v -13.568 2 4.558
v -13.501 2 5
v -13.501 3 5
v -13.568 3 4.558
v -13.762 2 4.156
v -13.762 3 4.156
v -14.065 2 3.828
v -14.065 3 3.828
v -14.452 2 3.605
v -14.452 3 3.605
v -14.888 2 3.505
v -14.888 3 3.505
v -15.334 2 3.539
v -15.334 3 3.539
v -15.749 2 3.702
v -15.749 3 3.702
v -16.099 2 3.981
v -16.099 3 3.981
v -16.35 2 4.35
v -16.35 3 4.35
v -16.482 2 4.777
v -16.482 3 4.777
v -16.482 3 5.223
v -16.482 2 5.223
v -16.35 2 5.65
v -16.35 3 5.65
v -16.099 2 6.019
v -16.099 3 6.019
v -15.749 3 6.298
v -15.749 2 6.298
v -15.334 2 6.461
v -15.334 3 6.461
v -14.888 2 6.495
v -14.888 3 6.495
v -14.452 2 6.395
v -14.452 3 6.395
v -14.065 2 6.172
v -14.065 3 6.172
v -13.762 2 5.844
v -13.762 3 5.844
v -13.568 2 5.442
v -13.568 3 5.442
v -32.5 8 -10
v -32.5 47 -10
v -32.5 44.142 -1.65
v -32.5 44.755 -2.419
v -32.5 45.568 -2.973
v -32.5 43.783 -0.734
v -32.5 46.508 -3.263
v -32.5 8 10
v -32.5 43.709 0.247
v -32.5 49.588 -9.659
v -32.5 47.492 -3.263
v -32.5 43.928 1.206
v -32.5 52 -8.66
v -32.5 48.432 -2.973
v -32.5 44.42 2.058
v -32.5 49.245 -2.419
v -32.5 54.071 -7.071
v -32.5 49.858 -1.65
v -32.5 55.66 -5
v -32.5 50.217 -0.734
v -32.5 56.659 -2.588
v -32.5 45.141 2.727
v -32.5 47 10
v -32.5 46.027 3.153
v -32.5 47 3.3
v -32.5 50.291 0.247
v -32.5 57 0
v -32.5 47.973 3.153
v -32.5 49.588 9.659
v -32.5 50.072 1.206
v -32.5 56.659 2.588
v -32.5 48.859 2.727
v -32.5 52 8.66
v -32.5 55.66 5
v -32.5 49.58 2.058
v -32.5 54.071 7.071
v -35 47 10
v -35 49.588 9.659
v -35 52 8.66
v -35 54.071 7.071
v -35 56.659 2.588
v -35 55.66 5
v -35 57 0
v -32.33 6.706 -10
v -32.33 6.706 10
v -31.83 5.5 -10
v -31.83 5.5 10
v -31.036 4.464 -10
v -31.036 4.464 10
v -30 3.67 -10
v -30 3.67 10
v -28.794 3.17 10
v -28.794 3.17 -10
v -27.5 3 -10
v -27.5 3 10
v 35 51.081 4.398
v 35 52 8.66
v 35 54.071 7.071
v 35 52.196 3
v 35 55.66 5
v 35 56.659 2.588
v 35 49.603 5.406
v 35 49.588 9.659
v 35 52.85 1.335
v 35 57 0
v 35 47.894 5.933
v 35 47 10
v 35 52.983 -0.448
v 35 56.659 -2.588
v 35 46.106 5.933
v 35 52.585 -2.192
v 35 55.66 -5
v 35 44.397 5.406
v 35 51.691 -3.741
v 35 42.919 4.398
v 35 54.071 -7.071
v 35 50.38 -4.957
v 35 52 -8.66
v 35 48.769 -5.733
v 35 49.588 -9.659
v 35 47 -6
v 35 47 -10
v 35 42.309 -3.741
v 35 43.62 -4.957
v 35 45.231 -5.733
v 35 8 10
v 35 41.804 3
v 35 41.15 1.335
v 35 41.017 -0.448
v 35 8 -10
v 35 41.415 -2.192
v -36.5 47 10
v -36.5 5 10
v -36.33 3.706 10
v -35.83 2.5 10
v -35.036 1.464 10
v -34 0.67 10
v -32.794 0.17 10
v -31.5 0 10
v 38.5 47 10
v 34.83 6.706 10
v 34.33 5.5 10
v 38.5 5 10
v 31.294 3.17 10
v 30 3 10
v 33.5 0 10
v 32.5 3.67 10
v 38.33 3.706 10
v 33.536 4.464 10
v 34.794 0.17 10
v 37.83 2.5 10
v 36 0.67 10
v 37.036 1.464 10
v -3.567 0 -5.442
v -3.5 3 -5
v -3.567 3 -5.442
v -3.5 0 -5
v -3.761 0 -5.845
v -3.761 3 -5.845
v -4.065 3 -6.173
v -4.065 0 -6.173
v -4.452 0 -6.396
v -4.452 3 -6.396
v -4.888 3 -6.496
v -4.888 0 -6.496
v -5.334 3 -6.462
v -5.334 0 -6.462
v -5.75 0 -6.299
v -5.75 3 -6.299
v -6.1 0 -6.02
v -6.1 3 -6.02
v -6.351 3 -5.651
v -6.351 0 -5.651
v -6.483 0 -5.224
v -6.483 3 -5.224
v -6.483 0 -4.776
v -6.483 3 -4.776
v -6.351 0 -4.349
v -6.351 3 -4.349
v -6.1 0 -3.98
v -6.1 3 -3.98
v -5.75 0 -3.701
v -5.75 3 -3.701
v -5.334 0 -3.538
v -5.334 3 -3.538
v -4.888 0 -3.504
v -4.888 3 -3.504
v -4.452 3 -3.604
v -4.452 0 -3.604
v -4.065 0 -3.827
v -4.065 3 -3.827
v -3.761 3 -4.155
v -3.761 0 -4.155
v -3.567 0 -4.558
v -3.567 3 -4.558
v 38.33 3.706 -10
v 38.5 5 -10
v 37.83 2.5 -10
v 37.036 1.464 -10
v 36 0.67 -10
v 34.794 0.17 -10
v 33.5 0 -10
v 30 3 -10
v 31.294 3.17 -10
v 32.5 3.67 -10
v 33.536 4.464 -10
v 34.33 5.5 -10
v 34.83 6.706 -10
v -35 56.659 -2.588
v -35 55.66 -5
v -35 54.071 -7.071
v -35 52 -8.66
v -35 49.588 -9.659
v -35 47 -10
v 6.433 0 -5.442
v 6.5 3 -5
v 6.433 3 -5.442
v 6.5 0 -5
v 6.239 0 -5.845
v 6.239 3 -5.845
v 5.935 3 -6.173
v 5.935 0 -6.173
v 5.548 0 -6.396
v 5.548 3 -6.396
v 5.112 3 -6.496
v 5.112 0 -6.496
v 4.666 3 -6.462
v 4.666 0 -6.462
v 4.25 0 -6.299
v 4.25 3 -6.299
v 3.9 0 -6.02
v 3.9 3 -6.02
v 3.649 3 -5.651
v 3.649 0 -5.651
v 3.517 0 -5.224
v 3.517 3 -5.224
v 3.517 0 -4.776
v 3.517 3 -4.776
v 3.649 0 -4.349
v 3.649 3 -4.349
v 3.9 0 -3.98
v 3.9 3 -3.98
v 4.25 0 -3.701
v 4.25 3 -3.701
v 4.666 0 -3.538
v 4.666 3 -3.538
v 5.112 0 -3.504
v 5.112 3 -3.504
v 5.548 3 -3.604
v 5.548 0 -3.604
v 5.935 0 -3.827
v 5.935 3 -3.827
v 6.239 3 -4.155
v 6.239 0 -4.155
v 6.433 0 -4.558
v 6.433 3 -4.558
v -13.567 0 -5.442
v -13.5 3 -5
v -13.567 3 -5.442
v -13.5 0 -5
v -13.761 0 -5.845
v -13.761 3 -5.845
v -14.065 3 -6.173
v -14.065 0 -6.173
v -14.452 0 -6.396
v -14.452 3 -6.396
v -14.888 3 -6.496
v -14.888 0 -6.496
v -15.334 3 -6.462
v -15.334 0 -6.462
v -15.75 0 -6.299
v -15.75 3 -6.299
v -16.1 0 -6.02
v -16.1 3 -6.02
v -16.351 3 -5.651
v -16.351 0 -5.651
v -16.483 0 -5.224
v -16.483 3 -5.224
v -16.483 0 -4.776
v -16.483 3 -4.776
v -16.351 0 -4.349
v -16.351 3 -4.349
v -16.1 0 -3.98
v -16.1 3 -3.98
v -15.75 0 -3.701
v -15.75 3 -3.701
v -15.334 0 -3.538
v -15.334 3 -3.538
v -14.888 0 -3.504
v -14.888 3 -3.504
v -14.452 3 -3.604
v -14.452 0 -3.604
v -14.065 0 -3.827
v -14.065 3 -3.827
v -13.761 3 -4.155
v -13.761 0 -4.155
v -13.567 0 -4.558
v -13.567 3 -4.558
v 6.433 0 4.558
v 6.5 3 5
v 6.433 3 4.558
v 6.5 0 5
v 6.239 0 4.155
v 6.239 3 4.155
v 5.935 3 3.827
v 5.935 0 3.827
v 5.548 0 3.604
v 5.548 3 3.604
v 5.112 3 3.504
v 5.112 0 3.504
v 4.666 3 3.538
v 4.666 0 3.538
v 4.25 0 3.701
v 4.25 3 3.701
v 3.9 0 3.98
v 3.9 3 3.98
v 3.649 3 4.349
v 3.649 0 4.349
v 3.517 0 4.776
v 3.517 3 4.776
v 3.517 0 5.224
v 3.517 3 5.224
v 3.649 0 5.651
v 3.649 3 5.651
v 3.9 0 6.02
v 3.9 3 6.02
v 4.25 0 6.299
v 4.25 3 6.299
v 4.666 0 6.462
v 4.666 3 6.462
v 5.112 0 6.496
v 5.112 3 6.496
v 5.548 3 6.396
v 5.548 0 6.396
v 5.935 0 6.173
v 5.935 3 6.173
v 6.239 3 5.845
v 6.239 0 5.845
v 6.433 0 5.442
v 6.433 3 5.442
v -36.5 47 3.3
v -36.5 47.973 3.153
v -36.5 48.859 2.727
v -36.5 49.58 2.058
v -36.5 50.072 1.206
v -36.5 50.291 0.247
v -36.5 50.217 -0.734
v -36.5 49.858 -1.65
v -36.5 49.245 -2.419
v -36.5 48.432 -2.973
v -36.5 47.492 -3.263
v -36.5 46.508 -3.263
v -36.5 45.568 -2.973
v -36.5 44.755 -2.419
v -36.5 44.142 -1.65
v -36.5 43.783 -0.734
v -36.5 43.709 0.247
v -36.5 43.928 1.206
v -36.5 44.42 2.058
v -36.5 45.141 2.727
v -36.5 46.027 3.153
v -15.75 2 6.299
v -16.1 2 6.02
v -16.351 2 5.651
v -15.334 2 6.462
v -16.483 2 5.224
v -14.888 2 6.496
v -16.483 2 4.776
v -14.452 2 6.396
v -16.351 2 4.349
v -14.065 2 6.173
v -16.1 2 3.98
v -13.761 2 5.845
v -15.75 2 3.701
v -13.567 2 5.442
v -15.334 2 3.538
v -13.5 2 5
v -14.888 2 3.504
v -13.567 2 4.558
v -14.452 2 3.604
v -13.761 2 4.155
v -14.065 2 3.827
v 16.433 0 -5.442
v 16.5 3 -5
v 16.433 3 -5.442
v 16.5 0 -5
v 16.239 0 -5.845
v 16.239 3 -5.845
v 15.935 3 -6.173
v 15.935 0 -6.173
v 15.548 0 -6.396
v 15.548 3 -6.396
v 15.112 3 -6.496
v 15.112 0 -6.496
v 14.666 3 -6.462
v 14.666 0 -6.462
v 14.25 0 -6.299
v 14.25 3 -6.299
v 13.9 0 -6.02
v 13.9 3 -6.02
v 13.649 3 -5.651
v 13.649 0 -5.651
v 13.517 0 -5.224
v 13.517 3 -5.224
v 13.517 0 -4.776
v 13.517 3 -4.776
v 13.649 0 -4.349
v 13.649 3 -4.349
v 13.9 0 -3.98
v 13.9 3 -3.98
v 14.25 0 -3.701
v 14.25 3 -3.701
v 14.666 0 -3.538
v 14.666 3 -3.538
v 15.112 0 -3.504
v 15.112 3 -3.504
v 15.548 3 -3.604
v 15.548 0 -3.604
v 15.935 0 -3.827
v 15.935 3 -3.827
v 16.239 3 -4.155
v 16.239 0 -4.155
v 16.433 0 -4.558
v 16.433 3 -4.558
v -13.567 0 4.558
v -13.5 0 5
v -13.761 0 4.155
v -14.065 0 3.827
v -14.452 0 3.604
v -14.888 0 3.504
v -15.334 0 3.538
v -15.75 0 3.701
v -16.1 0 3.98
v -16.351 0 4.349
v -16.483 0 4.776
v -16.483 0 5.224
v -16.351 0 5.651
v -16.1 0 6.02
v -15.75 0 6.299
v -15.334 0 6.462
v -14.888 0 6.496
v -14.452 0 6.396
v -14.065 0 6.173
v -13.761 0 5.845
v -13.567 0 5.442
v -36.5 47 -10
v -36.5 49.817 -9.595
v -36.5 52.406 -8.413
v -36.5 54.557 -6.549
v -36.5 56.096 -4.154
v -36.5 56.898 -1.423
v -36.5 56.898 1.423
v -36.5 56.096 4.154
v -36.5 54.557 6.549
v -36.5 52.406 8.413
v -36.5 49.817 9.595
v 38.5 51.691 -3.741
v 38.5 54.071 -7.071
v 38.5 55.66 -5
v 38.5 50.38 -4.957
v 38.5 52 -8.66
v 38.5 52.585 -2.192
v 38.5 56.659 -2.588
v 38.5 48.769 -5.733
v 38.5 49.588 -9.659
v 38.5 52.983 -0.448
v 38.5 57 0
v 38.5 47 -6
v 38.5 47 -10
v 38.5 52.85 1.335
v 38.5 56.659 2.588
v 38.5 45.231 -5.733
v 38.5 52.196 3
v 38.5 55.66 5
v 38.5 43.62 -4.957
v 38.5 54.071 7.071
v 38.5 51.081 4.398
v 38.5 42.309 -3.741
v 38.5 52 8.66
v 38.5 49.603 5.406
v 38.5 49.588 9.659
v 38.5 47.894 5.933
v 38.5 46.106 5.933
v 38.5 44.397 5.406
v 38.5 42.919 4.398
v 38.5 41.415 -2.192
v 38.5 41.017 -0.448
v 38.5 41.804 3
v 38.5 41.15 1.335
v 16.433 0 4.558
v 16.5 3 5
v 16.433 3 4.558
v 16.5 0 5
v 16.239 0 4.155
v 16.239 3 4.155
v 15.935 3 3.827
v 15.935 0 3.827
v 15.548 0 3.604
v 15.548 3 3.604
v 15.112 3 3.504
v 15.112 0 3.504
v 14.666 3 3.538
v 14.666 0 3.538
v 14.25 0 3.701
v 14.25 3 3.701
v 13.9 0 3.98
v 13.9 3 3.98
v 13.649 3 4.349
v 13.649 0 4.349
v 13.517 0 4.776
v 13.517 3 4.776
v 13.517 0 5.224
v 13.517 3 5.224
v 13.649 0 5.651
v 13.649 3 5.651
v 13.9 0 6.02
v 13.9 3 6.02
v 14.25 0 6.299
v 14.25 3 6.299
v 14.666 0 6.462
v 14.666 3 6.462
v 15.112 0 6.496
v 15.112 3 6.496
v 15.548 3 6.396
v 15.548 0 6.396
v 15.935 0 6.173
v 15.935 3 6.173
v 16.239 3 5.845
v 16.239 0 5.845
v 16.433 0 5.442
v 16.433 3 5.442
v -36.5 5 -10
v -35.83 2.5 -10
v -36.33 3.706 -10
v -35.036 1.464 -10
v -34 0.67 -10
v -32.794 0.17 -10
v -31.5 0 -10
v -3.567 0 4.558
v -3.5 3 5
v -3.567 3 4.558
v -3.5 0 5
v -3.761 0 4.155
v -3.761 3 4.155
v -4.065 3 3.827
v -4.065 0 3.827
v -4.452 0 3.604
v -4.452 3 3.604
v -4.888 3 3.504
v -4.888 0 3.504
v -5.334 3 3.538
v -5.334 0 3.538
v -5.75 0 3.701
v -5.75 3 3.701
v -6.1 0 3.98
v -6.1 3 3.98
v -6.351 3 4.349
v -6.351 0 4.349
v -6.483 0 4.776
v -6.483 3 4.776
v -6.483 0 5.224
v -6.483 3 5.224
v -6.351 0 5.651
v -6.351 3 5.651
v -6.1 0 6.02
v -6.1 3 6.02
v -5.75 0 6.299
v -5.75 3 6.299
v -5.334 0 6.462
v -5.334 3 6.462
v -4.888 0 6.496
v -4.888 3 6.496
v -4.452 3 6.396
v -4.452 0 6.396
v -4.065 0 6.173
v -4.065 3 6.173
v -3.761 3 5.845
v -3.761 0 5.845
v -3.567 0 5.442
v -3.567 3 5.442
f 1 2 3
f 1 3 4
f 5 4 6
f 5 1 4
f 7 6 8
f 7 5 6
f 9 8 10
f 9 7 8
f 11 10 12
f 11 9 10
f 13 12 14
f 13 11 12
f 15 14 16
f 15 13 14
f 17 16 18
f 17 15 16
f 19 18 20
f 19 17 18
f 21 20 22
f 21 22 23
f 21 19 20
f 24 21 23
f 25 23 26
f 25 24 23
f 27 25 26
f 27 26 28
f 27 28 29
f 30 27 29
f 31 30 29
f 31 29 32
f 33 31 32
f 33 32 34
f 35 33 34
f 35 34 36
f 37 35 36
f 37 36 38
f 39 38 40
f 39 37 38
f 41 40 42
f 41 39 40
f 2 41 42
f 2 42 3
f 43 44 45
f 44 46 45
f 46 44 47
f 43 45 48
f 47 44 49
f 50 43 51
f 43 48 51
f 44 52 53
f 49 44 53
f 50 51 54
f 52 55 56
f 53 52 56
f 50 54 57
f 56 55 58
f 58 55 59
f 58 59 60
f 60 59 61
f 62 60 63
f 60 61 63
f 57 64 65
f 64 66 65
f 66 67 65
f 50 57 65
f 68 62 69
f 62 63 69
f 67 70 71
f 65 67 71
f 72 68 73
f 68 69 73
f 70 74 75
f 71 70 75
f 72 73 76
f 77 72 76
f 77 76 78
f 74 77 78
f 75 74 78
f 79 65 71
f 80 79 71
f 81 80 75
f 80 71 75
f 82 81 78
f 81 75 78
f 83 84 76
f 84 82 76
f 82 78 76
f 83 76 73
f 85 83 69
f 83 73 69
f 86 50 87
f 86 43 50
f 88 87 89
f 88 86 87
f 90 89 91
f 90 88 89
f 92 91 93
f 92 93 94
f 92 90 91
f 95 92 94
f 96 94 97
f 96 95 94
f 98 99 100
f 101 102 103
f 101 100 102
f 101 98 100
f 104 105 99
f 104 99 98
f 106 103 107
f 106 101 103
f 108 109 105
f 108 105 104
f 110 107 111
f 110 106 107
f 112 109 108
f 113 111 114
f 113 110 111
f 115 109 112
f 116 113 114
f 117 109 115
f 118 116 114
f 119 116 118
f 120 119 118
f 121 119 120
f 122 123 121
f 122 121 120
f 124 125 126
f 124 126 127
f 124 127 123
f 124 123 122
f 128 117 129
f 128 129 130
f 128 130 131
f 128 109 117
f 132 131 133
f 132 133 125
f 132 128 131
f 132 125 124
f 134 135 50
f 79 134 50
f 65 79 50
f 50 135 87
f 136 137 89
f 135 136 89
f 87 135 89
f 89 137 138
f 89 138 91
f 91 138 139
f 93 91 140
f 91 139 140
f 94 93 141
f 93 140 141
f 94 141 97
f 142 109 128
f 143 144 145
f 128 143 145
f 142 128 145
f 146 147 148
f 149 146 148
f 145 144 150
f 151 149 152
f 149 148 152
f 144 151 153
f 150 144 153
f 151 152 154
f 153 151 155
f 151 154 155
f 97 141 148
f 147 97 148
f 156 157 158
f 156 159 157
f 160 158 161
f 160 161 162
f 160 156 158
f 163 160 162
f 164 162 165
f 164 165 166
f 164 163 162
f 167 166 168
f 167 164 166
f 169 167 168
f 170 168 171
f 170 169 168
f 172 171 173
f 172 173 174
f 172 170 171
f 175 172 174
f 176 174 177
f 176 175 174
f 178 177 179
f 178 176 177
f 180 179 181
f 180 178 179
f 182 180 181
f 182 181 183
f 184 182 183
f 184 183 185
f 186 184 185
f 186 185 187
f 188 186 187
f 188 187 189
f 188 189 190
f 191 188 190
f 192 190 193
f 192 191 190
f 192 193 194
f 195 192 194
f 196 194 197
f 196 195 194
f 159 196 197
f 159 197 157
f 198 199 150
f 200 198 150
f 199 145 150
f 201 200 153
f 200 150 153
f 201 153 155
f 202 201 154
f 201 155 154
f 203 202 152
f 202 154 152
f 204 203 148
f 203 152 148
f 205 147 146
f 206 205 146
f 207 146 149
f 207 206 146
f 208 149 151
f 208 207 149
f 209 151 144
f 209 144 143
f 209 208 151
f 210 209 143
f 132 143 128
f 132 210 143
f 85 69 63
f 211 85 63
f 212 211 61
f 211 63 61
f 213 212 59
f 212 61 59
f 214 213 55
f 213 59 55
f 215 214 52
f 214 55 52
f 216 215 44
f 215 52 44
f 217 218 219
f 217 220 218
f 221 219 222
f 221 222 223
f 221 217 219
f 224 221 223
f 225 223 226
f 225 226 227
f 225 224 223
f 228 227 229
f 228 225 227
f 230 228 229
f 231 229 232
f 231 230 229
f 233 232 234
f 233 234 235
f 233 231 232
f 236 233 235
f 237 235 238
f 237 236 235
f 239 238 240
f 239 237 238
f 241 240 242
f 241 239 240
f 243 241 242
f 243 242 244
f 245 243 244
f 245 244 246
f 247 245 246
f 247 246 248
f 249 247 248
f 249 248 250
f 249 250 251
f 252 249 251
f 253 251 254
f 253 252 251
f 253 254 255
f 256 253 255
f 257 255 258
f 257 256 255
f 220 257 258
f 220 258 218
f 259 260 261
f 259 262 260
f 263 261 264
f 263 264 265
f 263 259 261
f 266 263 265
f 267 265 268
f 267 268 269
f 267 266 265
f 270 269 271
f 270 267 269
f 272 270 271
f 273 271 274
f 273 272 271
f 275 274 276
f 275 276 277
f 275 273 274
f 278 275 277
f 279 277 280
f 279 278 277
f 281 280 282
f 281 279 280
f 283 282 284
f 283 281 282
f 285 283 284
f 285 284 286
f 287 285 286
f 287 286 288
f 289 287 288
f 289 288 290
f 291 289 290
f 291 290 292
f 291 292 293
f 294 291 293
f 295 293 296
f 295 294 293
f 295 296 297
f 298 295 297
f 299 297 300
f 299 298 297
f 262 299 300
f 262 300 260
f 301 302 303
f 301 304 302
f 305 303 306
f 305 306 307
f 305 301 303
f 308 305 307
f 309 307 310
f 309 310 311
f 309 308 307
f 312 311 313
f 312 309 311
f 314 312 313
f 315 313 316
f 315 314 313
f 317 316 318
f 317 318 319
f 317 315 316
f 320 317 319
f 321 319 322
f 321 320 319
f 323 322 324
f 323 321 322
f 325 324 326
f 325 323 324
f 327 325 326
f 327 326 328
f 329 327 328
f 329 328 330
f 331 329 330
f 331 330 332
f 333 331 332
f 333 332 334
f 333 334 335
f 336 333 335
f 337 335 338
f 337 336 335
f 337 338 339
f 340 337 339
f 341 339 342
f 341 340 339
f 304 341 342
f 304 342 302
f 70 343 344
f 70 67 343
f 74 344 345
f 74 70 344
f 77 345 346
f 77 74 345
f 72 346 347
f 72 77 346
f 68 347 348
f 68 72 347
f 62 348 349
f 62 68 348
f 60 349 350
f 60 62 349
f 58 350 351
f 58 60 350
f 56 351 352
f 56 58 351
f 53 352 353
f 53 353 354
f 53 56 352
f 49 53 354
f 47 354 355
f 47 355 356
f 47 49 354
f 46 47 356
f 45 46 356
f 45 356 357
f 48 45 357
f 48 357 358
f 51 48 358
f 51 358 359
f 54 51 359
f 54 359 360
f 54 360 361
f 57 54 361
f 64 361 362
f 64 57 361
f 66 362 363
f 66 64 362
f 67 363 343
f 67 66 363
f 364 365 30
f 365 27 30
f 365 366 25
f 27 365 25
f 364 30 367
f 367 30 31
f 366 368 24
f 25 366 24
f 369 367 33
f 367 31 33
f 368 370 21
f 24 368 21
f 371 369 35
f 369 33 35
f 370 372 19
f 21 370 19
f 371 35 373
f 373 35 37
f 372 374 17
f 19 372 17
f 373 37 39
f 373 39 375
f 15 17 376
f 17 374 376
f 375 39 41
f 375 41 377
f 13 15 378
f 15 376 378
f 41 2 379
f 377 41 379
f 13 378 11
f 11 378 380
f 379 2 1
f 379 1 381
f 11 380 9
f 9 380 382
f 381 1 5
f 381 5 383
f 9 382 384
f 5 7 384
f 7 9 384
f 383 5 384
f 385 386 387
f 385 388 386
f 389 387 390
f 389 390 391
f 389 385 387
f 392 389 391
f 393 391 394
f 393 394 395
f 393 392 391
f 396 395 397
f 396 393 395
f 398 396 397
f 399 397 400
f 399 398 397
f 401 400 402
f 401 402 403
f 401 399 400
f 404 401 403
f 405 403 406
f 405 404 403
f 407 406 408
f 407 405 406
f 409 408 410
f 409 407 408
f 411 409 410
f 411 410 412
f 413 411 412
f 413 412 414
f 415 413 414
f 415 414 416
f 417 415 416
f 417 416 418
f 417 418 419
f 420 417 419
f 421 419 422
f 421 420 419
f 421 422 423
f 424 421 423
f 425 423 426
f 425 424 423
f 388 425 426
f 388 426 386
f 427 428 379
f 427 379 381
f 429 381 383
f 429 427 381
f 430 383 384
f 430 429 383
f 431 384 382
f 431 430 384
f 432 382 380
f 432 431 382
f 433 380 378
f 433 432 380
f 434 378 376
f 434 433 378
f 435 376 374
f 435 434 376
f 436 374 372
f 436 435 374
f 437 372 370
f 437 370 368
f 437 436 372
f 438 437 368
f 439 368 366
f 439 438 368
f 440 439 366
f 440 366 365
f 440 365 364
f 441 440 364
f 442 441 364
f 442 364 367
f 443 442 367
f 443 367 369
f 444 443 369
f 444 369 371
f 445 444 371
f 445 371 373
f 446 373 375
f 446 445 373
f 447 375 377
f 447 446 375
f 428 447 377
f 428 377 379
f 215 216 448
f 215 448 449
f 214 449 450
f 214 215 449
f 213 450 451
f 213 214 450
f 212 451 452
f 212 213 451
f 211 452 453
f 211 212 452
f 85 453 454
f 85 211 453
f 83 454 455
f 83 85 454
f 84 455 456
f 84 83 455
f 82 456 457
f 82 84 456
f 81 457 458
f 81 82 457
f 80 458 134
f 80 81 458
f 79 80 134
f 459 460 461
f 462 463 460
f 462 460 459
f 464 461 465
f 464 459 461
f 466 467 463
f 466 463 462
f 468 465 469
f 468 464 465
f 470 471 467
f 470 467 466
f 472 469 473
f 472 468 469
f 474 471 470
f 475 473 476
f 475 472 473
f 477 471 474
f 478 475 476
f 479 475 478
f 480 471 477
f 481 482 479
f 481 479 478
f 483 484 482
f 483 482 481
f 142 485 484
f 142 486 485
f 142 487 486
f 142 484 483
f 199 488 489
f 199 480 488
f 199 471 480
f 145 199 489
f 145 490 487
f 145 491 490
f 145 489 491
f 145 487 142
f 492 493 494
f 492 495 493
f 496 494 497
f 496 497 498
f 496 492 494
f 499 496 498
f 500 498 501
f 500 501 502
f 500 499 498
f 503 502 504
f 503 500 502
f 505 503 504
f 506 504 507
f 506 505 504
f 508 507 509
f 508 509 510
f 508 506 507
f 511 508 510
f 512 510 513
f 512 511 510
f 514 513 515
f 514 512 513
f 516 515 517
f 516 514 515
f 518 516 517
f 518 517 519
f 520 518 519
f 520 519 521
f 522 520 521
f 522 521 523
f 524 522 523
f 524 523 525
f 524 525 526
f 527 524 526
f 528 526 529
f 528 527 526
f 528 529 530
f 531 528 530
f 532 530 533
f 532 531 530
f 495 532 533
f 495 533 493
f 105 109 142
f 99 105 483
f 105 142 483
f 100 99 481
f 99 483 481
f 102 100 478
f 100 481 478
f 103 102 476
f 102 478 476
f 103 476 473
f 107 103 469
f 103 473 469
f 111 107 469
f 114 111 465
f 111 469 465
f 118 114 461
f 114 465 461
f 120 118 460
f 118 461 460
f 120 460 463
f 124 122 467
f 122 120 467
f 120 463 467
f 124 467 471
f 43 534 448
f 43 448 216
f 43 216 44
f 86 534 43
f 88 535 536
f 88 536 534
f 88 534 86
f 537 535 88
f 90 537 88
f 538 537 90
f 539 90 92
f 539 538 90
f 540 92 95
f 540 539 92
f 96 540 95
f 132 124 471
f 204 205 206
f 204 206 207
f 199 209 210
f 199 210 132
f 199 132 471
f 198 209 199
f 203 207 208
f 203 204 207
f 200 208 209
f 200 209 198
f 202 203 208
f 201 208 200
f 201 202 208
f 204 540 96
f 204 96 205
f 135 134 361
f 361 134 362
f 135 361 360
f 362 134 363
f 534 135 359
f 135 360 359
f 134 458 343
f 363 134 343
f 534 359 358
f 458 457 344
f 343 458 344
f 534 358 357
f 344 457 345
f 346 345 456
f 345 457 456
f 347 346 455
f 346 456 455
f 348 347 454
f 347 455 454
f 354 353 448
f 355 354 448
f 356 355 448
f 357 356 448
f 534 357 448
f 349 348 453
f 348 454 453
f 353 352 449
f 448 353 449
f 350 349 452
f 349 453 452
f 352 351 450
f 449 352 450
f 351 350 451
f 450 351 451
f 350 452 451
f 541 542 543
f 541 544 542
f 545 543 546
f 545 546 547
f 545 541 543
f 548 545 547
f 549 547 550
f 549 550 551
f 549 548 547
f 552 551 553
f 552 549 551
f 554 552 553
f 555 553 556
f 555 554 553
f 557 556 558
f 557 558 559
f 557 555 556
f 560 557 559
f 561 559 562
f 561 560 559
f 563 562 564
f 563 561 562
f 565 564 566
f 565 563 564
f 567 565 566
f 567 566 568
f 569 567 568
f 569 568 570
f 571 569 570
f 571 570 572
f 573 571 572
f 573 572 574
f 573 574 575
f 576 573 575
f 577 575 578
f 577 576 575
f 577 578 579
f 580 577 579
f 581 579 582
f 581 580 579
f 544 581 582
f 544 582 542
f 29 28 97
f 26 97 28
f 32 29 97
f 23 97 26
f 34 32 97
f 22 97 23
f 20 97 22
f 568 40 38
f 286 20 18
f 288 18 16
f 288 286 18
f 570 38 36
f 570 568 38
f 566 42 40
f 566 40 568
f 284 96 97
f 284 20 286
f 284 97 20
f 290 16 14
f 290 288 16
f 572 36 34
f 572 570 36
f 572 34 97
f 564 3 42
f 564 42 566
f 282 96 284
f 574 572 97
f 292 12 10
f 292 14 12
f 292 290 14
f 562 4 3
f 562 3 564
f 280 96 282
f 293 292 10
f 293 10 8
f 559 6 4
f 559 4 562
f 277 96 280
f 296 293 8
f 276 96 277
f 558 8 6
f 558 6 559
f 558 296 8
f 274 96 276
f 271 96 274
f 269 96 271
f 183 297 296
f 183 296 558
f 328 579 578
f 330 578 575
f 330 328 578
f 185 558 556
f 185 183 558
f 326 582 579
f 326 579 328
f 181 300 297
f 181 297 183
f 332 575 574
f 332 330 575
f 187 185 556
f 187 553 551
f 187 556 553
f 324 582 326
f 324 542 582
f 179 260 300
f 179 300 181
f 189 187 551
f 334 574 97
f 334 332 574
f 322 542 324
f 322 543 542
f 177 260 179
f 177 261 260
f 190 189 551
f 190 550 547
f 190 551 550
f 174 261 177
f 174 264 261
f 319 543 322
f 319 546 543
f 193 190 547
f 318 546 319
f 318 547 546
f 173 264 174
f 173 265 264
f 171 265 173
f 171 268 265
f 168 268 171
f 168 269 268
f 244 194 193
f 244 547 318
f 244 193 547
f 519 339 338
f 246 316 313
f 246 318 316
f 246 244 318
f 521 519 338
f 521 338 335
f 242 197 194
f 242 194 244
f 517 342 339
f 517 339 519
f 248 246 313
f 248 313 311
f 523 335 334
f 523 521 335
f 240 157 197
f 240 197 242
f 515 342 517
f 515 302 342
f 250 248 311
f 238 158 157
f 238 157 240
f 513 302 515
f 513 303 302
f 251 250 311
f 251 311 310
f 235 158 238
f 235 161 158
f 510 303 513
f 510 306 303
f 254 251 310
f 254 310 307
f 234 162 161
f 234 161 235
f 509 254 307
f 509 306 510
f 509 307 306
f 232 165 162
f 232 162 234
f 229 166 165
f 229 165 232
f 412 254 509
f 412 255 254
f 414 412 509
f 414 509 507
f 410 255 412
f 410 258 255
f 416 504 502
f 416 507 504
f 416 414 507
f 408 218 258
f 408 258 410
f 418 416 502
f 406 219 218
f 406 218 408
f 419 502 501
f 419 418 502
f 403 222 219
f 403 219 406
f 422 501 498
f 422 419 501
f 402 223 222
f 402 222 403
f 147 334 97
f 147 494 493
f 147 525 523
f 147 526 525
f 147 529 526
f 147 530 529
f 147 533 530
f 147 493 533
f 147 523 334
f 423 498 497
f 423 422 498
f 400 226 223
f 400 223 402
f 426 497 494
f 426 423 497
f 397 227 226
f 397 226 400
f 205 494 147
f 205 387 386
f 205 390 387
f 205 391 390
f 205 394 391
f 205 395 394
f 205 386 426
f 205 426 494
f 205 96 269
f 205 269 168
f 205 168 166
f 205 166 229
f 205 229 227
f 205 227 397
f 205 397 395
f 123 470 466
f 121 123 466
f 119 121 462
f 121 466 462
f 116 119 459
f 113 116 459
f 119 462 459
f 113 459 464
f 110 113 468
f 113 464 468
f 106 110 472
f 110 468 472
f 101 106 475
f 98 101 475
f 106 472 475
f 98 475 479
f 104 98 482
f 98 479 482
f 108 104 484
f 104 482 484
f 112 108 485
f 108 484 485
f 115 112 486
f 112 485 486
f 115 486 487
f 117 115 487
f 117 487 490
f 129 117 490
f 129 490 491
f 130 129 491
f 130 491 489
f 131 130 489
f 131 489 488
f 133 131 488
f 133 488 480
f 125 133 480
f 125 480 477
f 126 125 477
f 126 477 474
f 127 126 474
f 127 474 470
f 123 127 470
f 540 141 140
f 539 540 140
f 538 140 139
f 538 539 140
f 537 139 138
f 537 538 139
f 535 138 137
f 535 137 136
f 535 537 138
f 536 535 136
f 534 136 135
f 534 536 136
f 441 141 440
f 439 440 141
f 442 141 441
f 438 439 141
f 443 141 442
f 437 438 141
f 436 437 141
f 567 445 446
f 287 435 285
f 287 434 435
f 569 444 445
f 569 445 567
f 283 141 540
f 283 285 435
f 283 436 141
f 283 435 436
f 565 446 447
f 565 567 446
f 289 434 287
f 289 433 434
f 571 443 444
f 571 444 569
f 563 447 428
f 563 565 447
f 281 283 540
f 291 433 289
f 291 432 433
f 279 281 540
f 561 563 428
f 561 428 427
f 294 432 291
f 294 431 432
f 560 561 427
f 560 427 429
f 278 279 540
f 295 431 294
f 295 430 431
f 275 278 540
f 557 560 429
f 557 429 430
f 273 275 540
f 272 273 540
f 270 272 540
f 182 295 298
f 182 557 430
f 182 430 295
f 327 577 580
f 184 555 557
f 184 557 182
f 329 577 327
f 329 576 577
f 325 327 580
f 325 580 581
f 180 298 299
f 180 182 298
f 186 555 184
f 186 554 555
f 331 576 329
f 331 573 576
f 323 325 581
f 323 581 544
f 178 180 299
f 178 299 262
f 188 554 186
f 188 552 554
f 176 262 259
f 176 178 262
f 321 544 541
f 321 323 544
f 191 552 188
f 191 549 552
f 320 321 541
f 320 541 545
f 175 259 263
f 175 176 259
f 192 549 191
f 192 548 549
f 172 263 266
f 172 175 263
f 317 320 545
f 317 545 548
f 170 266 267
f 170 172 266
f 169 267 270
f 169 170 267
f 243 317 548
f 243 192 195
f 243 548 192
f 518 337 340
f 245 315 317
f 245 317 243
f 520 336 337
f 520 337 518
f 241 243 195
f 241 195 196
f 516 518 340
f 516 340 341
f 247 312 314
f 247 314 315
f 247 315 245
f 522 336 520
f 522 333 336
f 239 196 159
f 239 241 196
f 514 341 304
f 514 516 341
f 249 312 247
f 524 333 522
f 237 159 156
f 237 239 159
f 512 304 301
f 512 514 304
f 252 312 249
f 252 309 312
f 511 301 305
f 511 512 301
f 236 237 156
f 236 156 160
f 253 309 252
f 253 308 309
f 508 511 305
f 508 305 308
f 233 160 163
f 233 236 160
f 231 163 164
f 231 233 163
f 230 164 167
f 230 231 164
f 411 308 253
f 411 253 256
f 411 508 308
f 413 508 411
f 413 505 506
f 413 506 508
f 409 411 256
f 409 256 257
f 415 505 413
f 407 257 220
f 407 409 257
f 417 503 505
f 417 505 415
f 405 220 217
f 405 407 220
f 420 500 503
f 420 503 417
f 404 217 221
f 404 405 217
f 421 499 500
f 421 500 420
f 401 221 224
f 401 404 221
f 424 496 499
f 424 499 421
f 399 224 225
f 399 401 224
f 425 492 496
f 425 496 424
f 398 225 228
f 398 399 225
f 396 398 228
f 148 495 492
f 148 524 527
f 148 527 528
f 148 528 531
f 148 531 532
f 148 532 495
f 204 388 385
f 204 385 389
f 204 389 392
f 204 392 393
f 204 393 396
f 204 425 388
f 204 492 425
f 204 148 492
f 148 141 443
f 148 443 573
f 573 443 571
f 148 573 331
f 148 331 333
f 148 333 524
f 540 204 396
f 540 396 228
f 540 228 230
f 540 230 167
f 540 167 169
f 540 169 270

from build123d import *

# Parameters (mm, degrees)
SKETCH_2_R          = 1.5
EXTRUDE_1_DEPTH     = 2
SKETCH_3_W          = 2.5
SKETCH_3_H          = 20
SKETCH_3_W_2        = 3.5
EXTRUDE_2_DEPTH     = 55
SKETCH_9_R          = 6
CUT_EXTRUDE_1_DEPTH = 87
SKETCH_7_R          = 6
SKETCH_7_R_2        = 3.3
EXTRUDE_3_DEPTH     = 2.5
SKETCH_10_R         = 3.3
EXTRUDE_4_DEPTH     = 1.5
SKETCH_11_W         = 67.5
SKETCH_11_H         = 20
SKETCH_11_R         = 1.5
SKETCH_11_R_2       = 1.498871695
EXTRUDE_5_DEPTH     = 1
FILLET_6_R          = 5
FILLET_7_R          = 5
FILLET_8_R          = 5


with BuildPart() as part:
    # 스케치2 → 보스-돌출1 (new body)
    with BuildSketch(Plane(origin=(0, 0, 0), x_dir=(1, 0, 0), z_dir=(0, 1, 0))):
        Polygon((35, -10), (-35, -10), (-35, 10), (35, 10), (38.5, 10), (38.5, -10), align=None)
        with Locations((-15, 5)):
            Circle(SKETCH_2_R, mode=Mode.SUBTRACT)
        with Locations((-5, 5)):
            Circle(SKETCH_2_R, mode=Mode.SUBTRACT)
        with Locations((-15, -5)):
            Circle(SKETCH_2_R, mode=Mode.SUBTRACT)
        with Locations((-5, -5)):
            Circle(SKETCH_2_R, mode=Mode.SUBTRACT)
        with Locations((15, -5)):
            Circle(SKETCH_2_R, mode=Mode.SUBTRACT)
        with Locations((5, -5)):
            Circle(SKETCH_2_R, mode=Mode.SUBTRACT)
        with Locations((5, 5)):
            Circle(SKETCH_2_R, mode=Mode.SUBTRACT)
        with Locations((15, 5)):
            Circle(SKETCH_2_R, mode=Mode.SUBTRACT)
    extrude(amount=EXTRUDE_1_DEPTH)

    # 스케치3 → 보스-돌출2 (add)
    with BuildSketch(Plane(origin=(0, 2, 0), x_dir=(1, 0, 0), z_dir=(0, 1, 0))):
        with Locations((-33.75, 0)):
            Rectangle(SKETCH_3_W, SKETCH_3_H)
        with Locations((36.75, 0)):
            Rectangle(SKETCH_3_W_2, SKETCH_3_H)
    extrude(amount=EXTRUDE_2_DEPTH)

    # 스케치9 → 컷-돌출1 (cut)
    with BuildSketch(Plane(origin=(38.5, 0, 0), x_dir=(0, 0, -1), z_dir=(1, 0, 0))):
        with BuildLine():
            Line((10, 57), (0, 57))
            ThreePointArc((0, 57), (7.071067812, 54.071067812), (10, 47))
            Line((10, 47), (10, 57))
        make_face()
        with BuildLine():
            Line((-10, 57), (-10, 47))
            ThreePointArc((-10, 47), (-7.071067812, 54.071067812), (0, 57))
            Line((0, 57), (-10, 57))
        make_face()
        with Locations((0, 47)):
            Circle(SKETCH_9_R)
    extrude(amount=-CUT_EXTRUDE_1_DEPTH, mode=Mode.SUBTRACT)

    # 스케치7 → 보스-돌출3 (add)
    with BuildSketch(Plane.ZY.offset(35)):
        with Locations((0, 47)):
            Circle(SKETCH_7_R)
        with Locations((0, 47)):
            Circle(SKETCH_7_R_2, mode=Mode.SUBTRACT)
    extrude(amount=-EXTRUDE_3_DEPTH)

    # 스케치10 → 보스-돌출4 (add)
    with BuildSketch(Plane.ZY.offset(35)):
        with BuildLine():
            ThreePointArc((-10, 47), (0, 57), (10, 47))
            Line((10, 47), (10, 0))
            Line((10, 0), (-10, 0))
            Line((-10, 0), (-10, 47))
        make_face()
        with Locations((0, 47)):
            Circle(SKETCH_10_R, mode=Mode.SUBTRACT)
    extrude(amount=EXTRUDE_4_DEPTH)

    # 스케치11 → 보스-돌출5 (add)
    with BuildSketch(Plane(origin=(0, 2, 0), x_dir=(1, 0, 0), z_dir=(0, 1, 0))):
        with Locations((1.25, 0)):
            Rectangle(SKETCH_11_W, SKETCH_11_H)
        with Locations((-15, 5)):
            Circle(SKETCH_11_R, mode=Mode.SUBTRACT)
        with Locations((-5, 5)):
            Circle(SKETCH_11_R, mode=Mode.SUBTRACT)
        with Locations((5, 5)):
            Circle(SKETCH_11_R, mode=Mode.SUBTRACT)
        with Locations((15, 5)):
            Circle(SKETCH_11_R, mode=Mode.SUBTRACT)
        with Locations((15, -5)):
            Circle(SKETCH_11_R, mode=Mode.SUBTRACT)
        with Locations((5, -5)):
            Circle(SKETCH_11_R, mode=Mode.SUBTRACT)
        with Locations((-5, -5)):
            Circle(SKETCH_11_R, mode=Mode.SUBTRACT)
        with Locations((-15, -5)):
            Circle(SKETCH_11_R_2, mode=Mode.SUBTRACT)
    extrude(amount=EXTRUDE_5_DEPTH)

    # 필렛6
    fillet_6_edges = [part.edges().sort_by_distance(p)[0] for p in [
        (-32.5, 3, 0),
    ]]
    fillet(fillet_6_edges, radius=FILLET_6_R)

    # 필렛7
    fillet_7_edges = [part.edges().sort_by_distance(p)[0] for p in [
        (35, 3, 0),
    ]]
    fillet(fillet_7_edges, radius=FILLET_7_R)

    # 필렛8
    fillet_8_edges = [part.edges().sort_by_distance(p)[0] for p in [
        (-36.5, 0, 0),
        (38.5, 0, 0),
    ]]
    fillet(fillet_8_edges, radius=FILLET_8_R)


solid = part.part
